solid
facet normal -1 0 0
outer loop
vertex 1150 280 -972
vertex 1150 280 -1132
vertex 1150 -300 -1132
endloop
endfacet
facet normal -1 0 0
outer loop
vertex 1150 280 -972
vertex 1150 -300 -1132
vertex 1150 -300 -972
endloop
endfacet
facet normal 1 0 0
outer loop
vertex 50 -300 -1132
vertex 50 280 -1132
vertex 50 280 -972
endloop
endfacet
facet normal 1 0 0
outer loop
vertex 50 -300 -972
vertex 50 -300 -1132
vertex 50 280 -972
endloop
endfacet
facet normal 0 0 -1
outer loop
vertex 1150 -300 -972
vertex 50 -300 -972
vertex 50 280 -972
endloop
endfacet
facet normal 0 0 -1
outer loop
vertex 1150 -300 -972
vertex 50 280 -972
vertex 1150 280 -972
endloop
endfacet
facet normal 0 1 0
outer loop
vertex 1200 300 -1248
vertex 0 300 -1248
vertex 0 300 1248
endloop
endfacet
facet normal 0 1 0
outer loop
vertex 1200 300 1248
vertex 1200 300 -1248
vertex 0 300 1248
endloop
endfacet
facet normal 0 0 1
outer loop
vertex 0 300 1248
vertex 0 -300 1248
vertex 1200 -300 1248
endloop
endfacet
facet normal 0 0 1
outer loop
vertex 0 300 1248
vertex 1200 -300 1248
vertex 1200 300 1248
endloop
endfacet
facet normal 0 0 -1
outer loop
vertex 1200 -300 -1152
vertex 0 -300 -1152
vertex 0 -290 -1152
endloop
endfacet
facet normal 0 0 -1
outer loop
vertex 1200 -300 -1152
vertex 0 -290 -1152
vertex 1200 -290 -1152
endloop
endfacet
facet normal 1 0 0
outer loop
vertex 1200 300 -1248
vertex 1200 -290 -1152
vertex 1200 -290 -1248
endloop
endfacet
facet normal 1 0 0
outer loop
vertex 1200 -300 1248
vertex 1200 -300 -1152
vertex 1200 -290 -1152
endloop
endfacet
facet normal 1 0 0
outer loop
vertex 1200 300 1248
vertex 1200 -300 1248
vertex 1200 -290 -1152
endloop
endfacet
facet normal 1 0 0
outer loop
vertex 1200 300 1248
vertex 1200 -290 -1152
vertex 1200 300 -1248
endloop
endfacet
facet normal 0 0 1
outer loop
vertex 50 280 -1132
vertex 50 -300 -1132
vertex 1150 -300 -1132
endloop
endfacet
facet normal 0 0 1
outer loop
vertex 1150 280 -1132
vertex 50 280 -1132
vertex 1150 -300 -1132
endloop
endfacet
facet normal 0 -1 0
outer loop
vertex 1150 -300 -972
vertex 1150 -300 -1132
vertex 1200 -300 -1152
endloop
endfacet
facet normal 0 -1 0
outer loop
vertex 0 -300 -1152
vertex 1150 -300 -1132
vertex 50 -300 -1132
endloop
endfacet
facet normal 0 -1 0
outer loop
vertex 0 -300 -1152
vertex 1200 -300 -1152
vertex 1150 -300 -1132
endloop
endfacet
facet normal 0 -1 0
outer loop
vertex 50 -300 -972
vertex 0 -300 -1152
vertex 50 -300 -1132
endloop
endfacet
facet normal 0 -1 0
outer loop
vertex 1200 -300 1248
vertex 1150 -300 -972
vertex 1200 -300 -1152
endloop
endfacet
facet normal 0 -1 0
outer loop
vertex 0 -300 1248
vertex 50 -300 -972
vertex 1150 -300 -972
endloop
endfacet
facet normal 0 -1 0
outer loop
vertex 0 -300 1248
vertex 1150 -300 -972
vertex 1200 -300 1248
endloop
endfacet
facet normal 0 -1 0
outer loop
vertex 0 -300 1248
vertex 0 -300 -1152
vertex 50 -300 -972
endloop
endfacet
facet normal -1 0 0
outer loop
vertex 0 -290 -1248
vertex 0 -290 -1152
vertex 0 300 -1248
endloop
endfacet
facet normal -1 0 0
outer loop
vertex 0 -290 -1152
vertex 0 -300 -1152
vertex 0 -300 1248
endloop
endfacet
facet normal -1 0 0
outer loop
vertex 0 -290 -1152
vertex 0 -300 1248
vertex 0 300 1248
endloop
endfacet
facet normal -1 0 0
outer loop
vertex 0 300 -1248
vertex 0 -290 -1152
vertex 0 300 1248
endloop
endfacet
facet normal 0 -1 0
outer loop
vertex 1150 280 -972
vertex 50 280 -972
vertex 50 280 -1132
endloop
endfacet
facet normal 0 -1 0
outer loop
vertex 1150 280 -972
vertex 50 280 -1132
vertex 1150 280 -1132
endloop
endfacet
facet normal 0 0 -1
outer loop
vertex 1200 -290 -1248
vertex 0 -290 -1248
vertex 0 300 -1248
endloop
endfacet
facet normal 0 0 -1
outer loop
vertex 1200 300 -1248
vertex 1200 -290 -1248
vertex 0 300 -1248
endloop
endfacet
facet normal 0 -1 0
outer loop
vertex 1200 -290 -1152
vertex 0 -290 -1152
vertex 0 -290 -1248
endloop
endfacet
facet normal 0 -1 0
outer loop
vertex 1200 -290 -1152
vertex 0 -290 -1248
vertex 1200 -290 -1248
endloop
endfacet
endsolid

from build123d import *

# Parameters (mm, degrees)
F0_W     = 600
F0_H     = 2496
F1_DEPTH = 1200
F2_W     = 1200
F2_H     = 96
F3_DEPTH = 10
F4_W     = 1100
F4_H     = 160
F5_DEPTH = 580


with BuildPart() as f1:
    # F0 (on Right) → F1 (new body)
    with BuildSketch(Plane.YZ):
        Rectangle(F0_W, F0_H)
    extrude(amount=F1_DEPTH)

    # F2 (on face) → F3 (cut)
    with BuildSketch(Plane.XZ.offset(300)):
        with Locations((600, -1200)):
            Rectangle(F2_W, F2_H)
    extrude(amount=-F3_DEPTH, mode=Mode.SUBTRACT)

    # F4 (on face) → F5 (cut)
    with BuildSketch(Plane.XZ.offset(300)):
        with Locations((600, -1052)):
            Rectangle(F4_W, F4_H)
    extrude(amount=-F5_DEPTH, mode=Mode.SUBTRACT)


solid = f1.part
